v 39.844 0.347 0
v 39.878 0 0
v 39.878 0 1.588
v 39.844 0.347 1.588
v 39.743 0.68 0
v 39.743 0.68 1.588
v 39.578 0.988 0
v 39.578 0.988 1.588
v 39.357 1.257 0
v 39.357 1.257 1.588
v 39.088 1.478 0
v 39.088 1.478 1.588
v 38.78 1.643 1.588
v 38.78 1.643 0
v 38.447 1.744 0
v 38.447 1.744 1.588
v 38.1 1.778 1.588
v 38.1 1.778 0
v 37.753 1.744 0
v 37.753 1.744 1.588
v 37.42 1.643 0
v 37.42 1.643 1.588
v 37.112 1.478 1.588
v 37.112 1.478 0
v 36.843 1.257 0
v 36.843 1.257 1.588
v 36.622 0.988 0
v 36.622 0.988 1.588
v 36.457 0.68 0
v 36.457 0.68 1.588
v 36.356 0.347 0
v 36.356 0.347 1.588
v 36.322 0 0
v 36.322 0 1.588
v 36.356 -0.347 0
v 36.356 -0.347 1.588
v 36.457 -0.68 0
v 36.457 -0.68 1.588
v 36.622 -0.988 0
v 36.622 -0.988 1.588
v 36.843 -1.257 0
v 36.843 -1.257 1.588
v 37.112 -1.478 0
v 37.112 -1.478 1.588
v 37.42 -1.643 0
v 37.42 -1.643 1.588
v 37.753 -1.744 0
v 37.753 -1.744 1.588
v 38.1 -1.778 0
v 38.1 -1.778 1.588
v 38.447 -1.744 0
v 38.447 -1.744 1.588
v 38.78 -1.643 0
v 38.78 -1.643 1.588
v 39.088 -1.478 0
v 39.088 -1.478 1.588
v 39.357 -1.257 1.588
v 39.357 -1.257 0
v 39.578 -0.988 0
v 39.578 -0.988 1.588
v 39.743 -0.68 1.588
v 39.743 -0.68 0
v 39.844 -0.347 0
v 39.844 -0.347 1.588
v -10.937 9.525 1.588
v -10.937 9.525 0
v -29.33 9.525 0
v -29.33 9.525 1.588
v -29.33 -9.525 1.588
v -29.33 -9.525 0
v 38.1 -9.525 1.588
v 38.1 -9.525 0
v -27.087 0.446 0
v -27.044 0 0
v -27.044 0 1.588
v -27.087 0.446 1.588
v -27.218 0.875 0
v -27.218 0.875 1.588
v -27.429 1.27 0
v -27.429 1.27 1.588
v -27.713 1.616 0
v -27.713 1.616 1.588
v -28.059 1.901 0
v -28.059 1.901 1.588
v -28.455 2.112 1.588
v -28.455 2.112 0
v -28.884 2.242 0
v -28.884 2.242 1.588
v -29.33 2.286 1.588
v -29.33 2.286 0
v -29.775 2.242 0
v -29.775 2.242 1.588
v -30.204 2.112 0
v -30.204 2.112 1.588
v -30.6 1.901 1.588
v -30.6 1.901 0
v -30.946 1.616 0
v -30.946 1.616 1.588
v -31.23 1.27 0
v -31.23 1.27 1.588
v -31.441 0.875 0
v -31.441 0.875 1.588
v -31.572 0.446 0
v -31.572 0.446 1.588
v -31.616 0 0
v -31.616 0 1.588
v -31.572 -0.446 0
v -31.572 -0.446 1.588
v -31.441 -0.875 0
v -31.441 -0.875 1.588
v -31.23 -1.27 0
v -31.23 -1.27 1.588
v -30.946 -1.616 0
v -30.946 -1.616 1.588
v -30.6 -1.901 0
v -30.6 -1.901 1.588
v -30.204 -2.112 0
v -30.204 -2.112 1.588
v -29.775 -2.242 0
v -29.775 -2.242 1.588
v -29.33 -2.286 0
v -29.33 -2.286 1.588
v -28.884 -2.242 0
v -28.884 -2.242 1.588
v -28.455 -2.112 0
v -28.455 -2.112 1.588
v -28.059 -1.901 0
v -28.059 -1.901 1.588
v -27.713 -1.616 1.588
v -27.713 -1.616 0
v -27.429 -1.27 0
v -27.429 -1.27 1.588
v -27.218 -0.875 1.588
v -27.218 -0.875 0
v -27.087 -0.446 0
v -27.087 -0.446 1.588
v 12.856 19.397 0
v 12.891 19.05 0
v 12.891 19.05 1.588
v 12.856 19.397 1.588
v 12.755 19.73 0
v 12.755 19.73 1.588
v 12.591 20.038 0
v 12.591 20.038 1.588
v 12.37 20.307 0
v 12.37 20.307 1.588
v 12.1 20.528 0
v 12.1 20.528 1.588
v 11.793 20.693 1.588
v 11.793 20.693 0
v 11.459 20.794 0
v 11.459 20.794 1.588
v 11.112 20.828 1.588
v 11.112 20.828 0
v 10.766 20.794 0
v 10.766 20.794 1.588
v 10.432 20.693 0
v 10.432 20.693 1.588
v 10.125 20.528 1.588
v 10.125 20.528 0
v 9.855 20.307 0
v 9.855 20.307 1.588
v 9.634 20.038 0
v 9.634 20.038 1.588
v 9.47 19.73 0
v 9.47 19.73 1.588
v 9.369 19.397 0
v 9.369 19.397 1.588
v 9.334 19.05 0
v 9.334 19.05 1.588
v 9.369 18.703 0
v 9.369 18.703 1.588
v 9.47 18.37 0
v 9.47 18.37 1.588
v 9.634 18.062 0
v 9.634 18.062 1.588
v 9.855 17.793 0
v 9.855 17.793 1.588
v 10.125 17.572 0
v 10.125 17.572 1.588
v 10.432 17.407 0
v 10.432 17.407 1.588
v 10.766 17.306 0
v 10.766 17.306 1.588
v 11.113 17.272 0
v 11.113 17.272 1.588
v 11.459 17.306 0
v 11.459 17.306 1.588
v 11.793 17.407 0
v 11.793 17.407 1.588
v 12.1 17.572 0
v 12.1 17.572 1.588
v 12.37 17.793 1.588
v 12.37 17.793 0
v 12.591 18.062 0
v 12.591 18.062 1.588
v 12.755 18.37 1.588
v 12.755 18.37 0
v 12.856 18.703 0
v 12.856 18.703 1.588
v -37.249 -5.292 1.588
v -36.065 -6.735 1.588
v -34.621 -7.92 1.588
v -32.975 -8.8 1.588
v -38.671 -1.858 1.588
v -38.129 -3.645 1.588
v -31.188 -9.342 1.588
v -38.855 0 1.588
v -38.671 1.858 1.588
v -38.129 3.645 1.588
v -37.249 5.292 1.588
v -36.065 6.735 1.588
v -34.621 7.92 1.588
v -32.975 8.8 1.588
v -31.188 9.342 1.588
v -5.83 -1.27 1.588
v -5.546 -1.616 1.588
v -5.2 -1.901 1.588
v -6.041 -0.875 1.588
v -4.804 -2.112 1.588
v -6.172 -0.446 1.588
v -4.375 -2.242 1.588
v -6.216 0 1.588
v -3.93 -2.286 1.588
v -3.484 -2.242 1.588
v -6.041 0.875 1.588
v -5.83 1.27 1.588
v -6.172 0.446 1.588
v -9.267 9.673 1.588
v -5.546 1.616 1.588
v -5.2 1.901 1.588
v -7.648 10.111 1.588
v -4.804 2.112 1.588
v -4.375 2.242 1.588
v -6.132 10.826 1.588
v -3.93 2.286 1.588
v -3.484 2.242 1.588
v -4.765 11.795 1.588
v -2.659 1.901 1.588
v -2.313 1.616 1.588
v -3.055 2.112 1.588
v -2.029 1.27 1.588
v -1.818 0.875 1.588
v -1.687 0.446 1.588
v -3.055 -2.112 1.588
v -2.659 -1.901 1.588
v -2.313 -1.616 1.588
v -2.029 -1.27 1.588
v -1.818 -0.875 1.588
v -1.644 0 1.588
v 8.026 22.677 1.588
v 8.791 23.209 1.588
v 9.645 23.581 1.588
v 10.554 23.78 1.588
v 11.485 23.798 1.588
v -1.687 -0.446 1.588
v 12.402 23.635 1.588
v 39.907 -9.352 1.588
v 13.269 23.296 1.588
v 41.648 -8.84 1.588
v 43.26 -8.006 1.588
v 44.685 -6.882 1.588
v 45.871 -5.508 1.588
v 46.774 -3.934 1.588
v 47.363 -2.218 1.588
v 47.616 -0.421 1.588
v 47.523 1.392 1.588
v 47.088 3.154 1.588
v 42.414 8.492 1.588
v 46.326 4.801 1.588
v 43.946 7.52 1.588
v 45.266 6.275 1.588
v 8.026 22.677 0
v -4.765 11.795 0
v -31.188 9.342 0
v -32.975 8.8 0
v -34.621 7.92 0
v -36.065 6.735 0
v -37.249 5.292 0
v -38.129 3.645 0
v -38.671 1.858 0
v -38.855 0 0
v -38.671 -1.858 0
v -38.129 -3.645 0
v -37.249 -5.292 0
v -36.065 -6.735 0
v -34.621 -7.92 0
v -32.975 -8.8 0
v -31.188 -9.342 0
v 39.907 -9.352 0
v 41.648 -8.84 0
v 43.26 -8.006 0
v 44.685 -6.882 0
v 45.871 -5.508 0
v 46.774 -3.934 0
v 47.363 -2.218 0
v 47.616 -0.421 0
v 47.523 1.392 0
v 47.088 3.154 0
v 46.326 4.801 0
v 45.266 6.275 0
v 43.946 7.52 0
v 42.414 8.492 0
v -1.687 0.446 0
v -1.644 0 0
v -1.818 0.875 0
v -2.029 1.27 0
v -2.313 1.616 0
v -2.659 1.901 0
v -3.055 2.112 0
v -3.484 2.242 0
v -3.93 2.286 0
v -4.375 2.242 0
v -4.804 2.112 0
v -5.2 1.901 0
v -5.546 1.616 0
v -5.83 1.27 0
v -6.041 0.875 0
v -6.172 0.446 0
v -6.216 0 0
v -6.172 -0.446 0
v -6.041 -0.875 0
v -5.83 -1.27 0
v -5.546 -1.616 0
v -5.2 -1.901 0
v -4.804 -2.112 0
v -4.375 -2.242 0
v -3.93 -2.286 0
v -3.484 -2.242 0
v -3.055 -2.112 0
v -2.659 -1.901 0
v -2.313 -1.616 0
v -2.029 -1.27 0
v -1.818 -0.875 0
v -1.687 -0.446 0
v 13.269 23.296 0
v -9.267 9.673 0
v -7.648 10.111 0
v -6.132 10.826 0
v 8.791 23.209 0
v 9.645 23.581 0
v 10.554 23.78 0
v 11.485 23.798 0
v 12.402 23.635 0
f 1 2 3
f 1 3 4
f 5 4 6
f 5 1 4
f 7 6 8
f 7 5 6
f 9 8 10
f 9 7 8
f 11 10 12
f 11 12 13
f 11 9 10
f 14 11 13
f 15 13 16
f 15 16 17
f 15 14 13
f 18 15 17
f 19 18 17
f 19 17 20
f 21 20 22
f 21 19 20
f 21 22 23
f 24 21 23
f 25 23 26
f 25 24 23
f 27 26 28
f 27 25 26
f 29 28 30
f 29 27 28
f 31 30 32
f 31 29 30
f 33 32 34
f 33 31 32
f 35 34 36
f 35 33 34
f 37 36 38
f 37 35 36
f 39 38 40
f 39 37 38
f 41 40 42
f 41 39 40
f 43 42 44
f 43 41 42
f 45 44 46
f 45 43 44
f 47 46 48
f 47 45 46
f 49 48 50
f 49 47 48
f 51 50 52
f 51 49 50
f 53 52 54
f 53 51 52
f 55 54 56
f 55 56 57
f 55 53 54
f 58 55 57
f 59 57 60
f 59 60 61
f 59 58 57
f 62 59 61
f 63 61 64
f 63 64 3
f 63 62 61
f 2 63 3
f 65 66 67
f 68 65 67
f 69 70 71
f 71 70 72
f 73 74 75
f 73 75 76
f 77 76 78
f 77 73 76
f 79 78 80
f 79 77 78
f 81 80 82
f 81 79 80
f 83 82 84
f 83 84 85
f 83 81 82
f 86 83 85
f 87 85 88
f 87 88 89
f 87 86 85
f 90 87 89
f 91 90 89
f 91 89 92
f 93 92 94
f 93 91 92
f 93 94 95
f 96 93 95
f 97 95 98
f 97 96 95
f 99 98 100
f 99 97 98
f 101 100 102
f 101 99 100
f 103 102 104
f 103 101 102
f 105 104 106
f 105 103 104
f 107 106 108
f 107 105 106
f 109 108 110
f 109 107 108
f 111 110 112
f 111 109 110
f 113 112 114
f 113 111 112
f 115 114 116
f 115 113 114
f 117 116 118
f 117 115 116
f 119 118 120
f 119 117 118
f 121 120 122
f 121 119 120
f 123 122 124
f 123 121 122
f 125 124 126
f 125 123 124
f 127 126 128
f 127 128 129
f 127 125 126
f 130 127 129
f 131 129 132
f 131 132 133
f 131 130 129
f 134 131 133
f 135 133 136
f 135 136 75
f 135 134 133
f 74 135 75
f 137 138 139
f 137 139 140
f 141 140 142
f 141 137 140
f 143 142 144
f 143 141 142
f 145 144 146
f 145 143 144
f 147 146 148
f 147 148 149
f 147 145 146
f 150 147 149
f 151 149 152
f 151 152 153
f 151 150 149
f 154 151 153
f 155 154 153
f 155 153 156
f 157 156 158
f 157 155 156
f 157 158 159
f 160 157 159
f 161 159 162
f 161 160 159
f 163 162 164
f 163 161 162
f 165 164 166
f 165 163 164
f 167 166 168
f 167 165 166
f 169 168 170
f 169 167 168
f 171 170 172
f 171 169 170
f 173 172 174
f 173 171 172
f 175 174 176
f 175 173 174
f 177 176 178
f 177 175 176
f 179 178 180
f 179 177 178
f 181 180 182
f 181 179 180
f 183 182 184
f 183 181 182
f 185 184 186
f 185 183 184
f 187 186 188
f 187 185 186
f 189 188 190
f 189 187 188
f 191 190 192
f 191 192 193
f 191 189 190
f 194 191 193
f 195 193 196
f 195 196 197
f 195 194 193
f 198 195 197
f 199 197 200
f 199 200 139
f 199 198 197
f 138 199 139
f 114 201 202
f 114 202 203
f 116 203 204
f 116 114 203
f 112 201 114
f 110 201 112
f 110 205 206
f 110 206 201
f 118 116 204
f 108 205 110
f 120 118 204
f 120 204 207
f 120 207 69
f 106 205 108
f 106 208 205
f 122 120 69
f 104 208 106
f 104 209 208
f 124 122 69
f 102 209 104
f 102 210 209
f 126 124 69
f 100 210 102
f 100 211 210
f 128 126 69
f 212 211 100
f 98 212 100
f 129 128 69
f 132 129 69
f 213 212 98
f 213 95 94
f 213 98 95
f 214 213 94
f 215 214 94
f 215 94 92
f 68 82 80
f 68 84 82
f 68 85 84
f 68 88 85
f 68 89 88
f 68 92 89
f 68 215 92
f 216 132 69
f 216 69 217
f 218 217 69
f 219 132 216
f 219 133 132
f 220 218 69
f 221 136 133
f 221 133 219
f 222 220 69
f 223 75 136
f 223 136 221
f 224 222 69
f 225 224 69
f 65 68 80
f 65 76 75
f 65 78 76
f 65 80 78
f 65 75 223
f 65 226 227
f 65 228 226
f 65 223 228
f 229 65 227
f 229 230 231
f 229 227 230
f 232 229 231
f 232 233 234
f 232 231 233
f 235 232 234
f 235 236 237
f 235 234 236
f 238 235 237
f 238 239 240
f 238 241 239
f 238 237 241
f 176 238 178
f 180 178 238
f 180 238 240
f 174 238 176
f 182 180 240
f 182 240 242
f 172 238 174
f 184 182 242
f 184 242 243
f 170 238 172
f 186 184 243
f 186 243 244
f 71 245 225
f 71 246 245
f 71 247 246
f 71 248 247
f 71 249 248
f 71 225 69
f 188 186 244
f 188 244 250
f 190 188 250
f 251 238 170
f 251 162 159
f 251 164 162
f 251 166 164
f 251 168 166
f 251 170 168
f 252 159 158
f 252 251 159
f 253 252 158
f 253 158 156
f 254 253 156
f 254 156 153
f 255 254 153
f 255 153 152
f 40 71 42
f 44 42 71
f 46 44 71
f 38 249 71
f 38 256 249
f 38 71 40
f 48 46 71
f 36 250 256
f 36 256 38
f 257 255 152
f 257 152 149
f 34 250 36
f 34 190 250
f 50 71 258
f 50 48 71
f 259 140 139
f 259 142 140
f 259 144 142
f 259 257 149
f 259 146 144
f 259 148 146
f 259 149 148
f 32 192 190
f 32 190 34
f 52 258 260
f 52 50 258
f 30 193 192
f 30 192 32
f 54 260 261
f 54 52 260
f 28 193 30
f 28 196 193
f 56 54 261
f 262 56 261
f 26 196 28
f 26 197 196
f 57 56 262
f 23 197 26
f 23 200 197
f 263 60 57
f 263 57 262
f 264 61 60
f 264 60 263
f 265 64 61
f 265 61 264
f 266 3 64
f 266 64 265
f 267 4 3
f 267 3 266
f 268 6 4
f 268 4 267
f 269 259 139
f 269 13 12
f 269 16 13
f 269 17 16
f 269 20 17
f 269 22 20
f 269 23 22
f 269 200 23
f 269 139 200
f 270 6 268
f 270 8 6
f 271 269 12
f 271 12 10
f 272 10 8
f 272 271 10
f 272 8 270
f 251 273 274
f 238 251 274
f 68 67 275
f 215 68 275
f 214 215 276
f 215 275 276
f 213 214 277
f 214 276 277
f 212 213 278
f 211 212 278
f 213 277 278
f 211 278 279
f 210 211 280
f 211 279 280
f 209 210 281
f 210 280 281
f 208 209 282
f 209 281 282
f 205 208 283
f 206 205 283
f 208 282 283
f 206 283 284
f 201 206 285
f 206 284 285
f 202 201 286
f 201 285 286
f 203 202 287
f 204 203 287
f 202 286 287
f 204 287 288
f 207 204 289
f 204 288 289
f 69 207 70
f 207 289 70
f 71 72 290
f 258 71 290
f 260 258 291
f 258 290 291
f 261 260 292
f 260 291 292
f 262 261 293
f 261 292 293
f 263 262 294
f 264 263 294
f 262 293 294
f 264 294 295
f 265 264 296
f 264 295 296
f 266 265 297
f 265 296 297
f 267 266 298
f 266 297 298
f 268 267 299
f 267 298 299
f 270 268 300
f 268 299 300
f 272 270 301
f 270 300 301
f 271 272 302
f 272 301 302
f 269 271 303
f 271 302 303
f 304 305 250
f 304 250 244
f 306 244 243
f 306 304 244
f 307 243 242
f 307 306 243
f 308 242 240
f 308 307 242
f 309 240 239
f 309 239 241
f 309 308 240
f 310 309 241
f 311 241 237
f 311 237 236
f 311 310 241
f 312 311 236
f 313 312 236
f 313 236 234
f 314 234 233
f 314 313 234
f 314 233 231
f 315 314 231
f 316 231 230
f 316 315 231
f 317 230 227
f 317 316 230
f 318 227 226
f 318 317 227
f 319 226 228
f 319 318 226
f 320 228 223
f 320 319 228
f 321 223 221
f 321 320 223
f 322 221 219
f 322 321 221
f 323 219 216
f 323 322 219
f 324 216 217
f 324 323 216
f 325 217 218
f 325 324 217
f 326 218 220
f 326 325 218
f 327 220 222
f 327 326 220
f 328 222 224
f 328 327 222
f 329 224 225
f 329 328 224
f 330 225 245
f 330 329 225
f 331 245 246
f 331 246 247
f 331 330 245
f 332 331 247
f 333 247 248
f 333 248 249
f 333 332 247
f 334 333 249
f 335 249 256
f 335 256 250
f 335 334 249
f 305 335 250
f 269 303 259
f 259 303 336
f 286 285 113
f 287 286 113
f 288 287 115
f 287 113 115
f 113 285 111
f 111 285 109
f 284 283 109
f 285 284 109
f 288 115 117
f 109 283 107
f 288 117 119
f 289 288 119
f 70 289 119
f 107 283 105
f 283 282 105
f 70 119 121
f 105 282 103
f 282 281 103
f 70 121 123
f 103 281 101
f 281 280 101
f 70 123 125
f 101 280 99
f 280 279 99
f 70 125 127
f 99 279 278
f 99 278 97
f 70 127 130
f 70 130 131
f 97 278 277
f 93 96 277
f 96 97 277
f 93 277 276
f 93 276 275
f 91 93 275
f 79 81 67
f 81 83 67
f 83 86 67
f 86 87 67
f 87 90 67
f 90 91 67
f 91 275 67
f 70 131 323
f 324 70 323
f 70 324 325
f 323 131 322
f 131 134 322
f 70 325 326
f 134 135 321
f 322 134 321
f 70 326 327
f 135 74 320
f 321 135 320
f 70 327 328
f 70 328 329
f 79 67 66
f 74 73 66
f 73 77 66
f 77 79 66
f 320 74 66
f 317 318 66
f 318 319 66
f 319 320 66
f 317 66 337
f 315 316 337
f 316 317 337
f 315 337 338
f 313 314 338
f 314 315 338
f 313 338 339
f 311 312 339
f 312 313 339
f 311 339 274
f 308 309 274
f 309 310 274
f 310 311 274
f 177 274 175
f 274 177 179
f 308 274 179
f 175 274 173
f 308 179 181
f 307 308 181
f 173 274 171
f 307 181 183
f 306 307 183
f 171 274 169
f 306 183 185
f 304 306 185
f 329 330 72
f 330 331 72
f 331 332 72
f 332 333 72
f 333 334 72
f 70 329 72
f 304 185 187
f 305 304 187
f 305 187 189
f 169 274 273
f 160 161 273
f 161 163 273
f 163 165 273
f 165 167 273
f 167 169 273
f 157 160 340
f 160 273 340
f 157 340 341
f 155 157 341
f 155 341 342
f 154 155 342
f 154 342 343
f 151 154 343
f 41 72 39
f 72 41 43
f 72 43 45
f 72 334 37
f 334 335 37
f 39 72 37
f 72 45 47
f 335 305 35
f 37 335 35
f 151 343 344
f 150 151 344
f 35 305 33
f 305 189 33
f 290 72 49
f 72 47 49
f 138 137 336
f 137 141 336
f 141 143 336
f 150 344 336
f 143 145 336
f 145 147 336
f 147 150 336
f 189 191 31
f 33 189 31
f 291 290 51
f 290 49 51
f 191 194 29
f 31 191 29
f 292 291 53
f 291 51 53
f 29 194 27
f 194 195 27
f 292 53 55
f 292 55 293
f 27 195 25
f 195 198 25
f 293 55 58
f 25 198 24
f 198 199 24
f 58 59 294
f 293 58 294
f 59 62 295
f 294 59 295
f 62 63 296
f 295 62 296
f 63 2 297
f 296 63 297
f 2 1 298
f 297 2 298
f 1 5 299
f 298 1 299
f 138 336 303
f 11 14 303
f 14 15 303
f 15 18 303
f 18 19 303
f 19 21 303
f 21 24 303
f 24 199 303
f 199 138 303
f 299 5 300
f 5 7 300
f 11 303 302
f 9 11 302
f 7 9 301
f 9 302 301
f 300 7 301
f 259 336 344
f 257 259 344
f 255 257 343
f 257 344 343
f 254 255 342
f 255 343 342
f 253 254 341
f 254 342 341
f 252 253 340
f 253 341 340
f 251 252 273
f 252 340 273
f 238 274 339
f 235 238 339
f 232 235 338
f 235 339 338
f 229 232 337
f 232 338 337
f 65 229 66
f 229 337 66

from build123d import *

# Parameters (mm, degrees)
SKETCH1_R           = 2.286
SKETCH1_R_2         = 1.778
BOSS_EXTRUDE1_DEPTH = 1.5875


with BuildPart() as part:
    # Sketch1 → Boss-Extrude1 (new body)
    with BuildSketch(Plane.XY):
        with BuildLine():
            Line((-3.929505469, -9.525), (38.1, -9.525))
            ThreePointArc((38.1, -9.525), (47.363212424, -2.217773791), (42.413639839, 8.492239772))
            Line((42.413639839, 8.492239772), (13.269319919, 23.296119886))
            ThreePointArc((13.269319919, 23.296119886), (10.554316452, 23.779676244), (8.026471806, 22.677373187))
            Line((8.026471806, 22.677373187), (-4.764567756, 11.795253626))
            ThreePointArc((-4.764567756, 11.795253626), (-7.648450959, 10.11056254), (-10.936624143, 9.525))
            Line((-10.936624143, 9.525), (-29.329505469, 9.525))
            ThreePointArc((-29.329505469, 9.525), (-38.854505469, 0), (-29.329505469, -9.525))
            Line((-29.329505469, -9.525), (-3.929505469, -9.525))
        make_face()
        with Locations((-3.929505469, 0)):
            Circle(SKETCH1_R, mode=Mode.SUBTRACT)
        with Locations((38.1, 0)):
            Circle(SKETCH1_R_2, mode=Mode.SUBTRACT)
        with Locations((11.1125, 19.05)):
            Circle(SKETCH1_R_2, mode=Mode.SUBTRACT)
        with Locations((-29.329505469, 0)):
            Circle(SKETCH1_R, mode=Mode.SUBTRACT)
    extrude(amount=BOSS_EXTRUDE1_DEPTH)


solid = part.part
